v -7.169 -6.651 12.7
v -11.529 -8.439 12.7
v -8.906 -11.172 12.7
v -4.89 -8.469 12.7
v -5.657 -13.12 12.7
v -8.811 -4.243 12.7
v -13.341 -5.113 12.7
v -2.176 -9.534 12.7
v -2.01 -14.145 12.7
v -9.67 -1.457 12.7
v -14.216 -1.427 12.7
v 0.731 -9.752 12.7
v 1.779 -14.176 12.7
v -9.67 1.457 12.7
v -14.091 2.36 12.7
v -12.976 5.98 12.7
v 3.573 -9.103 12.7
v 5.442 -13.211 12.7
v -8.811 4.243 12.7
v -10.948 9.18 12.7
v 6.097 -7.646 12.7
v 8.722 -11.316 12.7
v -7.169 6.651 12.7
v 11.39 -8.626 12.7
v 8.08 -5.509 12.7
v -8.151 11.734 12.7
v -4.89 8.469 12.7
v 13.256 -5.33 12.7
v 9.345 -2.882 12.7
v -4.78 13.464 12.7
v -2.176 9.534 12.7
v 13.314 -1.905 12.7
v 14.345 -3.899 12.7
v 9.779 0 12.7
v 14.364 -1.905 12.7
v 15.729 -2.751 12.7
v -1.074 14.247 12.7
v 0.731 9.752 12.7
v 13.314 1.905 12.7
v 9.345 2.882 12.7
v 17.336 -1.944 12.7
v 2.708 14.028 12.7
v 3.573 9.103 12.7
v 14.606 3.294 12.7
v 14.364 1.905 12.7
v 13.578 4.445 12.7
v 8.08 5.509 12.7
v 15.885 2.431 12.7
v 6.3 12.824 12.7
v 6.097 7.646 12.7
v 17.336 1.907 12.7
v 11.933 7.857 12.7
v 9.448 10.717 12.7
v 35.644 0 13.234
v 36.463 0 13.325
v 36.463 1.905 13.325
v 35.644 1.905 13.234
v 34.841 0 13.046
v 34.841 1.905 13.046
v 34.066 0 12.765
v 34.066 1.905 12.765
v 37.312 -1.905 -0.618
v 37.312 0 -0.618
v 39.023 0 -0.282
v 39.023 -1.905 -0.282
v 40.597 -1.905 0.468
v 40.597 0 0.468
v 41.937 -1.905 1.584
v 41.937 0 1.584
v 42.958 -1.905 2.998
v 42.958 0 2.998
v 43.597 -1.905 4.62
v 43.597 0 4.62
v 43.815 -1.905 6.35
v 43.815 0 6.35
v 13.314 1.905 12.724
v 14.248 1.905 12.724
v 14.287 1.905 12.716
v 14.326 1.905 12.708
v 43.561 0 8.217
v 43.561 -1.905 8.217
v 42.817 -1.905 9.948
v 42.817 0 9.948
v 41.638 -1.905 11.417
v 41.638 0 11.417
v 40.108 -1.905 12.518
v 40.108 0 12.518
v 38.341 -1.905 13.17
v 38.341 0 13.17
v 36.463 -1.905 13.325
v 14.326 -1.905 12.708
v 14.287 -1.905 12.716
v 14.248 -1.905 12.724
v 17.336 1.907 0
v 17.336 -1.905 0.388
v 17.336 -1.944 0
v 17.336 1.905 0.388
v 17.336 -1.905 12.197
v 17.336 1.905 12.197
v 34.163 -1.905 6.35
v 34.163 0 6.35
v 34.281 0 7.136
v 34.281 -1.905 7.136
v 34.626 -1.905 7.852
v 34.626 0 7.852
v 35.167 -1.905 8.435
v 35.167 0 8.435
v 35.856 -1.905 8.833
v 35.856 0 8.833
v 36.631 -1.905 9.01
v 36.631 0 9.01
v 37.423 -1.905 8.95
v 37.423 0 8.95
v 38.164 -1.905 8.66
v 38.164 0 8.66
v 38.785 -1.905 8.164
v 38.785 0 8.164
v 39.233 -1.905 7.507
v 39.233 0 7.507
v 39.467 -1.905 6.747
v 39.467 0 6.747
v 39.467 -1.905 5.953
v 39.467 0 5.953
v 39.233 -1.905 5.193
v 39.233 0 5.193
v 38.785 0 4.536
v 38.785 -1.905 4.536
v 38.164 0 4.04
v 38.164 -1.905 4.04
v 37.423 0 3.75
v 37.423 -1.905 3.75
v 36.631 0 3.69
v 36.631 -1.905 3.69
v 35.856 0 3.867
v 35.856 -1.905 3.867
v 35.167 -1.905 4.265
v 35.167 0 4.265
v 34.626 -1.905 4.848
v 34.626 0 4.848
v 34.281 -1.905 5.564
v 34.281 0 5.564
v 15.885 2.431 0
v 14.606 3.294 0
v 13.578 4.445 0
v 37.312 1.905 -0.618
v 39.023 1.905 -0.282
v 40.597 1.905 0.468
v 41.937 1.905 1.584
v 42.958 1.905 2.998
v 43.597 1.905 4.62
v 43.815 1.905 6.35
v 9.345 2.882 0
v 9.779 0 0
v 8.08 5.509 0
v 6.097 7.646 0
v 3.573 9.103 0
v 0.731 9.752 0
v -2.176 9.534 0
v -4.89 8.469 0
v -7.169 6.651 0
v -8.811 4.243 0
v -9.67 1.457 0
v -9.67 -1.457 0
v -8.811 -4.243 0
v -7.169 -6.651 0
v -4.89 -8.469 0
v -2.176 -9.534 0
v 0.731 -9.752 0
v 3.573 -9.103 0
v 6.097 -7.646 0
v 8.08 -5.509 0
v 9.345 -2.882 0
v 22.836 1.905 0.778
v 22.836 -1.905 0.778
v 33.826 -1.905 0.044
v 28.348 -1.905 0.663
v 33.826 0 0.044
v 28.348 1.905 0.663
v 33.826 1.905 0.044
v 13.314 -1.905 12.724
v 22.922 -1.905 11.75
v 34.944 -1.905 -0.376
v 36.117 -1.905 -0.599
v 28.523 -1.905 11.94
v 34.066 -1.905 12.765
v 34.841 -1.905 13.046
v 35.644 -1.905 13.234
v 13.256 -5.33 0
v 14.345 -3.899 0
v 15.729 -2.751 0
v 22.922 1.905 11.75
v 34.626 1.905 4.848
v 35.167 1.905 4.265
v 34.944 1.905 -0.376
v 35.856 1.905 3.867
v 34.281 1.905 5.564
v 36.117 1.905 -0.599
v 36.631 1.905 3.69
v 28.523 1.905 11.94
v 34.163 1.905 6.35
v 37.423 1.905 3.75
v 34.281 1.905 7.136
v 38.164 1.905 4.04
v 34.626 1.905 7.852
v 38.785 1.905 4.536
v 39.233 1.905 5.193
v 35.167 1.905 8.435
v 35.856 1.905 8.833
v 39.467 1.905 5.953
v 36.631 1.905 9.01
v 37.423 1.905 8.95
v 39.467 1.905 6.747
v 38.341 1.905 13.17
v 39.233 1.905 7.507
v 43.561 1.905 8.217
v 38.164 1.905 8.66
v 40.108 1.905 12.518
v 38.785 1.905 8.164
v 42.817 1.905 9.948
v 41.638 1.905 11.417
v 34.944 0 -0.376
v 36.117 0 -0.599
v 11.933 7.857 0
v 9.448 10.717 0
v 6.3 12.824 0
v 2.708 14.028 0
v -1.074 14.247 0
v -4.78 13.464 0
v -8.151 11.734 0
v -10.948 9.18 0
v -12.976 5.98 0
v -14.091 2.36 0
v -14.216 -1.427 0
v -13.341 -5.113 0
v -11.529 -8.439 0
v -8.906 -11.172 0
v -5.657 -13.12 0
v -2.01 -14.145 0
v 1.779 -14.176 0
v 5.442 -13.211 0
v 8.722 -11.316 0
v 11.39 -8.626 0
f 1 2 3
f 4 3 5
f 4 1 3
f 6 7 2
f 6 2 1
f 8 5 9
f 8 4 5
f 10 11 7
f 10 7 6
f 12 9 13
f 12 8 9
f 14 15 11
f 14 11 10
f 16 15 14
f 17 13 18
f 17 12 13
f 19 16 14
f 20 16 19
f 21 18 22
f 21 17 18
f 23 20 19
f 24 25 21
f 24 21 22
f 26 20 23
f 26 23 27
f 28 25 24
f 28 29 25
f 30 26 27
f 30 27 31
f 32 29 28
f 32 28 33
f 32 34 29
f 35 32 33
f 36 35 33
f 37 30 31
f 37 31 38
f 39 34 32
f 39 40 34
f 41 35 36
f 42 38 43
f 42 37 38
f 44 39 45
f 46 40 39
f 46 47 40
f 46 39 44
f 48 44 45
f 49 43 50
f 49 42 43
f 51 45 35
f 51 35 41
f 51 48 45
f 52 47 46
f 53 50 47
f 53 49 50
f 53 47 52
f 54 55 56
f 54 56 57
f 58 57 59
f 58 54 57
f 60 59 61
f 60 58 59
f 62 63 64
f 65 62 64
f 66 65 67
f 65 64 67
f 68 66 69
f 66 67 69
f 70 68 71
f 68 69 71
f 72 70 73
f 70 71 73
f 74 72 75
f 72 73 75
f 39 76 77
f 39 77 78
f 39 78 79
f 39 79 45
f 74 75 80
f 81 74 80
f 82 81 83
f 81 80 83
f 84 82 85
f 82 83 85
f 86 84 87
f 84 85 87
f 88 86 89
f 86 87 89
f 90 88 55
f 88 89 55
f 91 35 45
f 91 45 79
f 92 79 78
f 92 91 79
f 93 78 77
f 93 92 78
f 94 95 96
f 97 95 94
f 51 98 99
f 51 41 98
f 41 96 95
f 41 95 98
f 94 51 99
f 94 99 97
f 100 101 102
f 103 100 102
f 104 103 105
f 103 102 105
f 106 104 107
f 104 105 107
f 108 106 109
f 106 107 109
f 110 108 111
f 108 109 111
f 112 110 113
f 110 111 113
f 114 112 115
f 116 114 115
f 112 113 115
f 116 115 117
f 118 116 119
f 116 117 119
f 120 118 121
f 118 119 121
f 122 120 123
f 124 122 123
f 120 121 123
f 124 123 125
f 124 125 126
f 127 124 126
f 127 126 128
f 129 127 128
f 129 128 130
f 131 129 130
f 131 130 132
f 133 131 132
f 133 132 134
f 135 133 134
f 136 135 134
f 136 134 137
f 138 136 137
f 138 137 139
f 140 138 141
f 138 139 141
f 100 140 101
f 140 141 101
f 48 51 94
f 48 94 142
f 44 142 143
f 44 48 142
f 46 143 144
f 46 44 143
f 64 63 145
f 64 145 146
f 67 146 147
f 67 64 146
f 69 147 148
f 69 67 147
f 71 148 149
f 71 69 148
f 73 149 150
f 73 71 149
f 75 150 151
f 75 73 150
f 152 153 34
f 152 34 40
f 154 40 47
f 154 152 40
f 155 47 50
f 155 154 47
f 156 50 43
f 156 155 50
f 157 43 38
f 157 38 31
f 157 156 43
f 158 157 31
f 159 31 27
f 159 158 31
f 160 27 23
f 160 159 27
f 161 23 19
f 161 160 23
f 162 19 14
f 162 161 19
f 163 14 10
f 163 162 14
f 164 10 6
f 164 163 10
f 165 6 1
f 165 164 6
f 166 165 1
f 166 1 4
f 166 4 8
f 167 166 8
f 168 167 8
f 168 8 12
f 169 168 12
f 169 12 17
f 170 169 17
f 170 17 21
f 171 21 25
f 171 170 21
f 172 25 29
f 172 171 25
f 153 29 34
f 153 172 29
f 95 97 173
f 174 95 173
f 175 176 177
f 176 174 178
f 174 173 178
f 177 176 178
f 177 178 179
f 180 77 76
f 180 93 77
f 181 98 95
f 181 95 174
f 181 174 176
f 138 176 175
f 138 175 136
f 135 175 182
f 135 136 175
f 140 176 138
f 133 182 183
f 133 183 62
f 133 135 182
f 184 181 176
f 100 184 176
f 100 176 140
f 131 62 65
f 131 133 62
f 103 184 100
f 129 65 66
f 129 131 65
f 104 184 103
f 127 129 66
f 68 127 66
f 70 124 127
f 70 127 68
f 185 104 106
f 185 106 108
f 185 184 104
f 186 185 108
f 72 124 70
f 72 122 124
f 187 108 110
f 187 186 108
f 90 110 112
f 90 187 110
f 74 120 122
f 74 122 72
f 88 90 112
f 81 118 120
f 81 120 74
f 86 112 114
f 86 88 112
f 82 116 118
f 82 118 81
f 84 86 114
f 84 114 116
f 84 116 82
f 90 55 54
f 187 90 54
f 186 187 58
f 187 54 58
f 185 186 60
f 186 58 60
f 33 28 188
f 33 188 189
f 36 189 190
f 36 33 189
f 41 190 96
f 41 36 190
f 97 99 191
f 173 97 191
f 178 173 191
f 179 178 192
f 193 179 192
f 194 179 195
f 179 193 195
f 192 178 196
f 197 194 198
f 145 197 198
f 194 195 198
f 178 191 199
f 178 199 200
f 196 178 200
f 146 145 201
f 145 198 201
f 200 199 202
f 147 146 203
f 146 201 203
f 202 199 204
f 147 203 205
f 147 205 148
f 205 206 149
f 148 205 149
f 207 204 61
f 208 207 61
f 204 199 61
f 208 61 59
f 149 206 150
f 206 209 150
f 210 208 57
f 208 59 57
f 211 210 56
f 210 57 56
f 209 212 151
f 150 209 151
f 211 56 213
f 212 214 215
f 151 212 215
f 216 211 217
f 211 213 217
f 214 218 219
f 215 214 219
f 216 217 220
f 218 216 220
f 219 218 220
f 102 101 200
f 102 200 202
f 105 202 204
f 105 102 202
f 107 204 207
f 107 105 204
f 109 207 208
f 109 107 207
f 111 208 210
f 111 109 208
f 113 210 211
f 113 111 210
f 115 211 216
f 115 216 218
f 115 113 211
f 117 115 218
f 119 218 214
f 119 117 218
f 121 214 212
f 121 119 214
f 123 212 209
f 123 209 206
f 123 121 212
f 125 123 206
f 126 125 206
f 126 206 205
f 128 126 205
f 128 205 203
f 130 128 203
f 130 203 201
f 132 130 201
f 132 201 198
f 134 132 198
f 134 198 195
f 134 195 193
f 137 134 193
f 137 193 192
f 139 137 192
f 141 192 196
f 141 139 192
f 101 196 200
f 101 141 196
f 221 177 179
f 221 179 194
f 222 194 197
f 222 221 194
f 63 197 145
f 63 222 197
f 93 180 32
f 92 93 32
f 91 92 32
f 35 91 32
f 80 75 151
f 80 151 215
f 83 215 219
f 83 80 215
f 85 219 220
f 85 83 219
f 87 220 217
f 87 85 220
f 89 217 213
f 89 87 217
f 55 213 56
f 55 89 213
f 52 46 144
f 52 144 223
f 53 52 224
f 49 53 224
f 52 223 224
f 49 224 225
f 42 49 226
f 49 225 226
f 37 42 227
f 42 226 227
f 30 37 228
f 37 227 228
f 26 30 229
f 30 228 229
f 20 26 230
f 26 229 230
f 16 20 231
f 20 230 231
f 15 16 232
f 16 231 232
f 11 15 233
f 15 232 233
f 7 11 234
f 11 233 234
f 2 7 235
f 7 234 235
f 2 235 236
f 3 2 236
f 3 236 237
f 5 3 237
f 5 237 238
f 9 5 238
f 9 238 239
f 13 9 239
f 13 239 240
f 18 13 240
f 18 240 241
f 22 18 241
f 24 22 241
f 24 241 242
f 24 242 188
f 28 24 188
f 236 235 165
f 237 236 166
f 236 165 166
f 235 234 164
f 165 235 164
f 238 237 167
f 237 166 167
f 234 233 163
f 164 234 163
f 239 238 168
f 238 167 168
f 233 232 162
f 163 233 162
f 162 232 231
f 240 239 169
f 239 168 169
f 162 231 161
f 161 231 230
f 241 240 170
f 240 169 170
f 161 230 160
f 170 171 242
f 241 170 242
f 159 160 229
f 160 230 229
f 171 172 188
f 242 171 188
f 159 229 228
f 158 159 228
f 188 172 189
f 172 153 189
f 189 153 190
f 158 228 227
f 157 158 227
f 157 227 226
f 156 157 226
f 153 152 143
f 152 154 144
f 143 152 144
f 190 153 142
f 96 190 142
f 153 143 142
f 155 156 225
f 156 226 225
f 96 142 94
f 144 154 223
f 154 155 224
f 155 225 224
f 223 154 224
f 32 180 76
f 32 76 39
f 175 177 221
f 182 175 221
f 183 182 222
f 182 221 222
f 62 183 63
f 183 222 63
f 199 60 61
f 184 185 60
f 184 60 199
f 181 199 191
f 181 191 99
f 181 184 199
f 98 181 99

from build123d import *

# Parameters (mm, degrees)
F0_R          = 14.2875
F0_R_2        = 9.779
F1_DEPTH      = 12.7
F3_DEPTH      = 1.905
F3_DEPTH_BACK = 1.905
F5_DEPTH      = 12.7


with BuildPart() as f1:
    # F0 (on Top) → F1 (new body)
    with BuildSketch(Plane.XY):
        Circle(F0_R)
        Circle(F0_R_2, mode=Mode.SUBTRACT)
    extrude(amount=F1_DEPTH)

    # F2 (on Front) → F3 (join, two sides)
    with BuildSketch(Plane.XZ) as f3_sk:
        with BuildLine():
            Line((13.3136538789, 12.7235082909), (13.3136538789, 6.35))
            Line((13.3136538789, 6.35), (29.845, 6.35))
            ThreePointArc((29.845, 6.35), (30.994771982, 10.18931491), (34.0655694999, 12.7646823))
            ThreePointArc((34.0655694999, 12.7646823), (24.1589088565, 11.7366418782), (14.2480619252, 12.7235082909))
            Line((14.2480619252, 12.7235082909), (13.3136538789, 12.7235082909))
        make_face()
        with BuildLine():
            Line((29.845, 6.35), (13.3136538789, 6.35))
            Line((13.3136538789, 6.35), (13.3136538789, 0))
            Line((13.3136538789, 0), (14.5748257637, 0))
            ThreePointArc((14.5748257637, 0), (24.1986734185, 0.7965285613), (33.8260559146, 0.0439279316))
            ThreePointArc((33.8260559146, 0.0439279316), (30.9235300544, 2.6212149725), (29.845, 6.35))
        make_face()
        with BuildLine():
            ThreePointArc((34.0655694999, 12.7646823), (30.994771982, 10.18931491), (29.845, 6.35))
            ThreePointArc((29.845, 6.35), (30.9235300544, 2.6212149725), (33.8260559146, 0.0439279316))
            ThreePointArc((33.8260559146, 0.0439279316), (35.5736615146, -0.2615447543), (37.311506327, -0.6183840779))
            ThreePointArc((37.311506327, -0.6183840779), (41.9365422105, 1.5841368407), (43.815, 6.35))
            ThreePointArc((43.815, 6.35), (41.6376310588, 11.4172387552), (36.4629860837, 13.3253513019))
            ThreePointArc((36.4629860837, 13.3253513019), (35.2677832143, 13.0300276397), (34.0655694999, 12.7646823))
        make_face()
        with BuildLine():
            ThreePointArc((39.497, 6.35), (36.83, 3.683), (34.163, 6.35))
            ThreePointArc((34.163, 6.35), (36.83, 9.017), (39.497, 6.35))
        make_face(mode=Mode.SUBTRACT)
        with BuildLine():
            ThreePointArc((36.4629860837, 13.3253513019), (35.2393795344, 13.1514815691), (34.0655694999, 12.7646823))
            ThreePointArc((34.0655694999, 12.7646823), (35.2677832143, 13.0300276397), (36.4629860837, 13.3253513019))
        make_face()
        with BuildLine():
            ThreePointArc((37.311506327, -0.6183840779), (35.5736615146, -0.2615447543), (33.8260559146, 0.0439279316))
            ThreePointArc((33.8260559146, 0.0439279316), (35.5260301534, -0.5122071988), (37.311506327, -0.6183840779))
        make_face()
    extrude(amount=F3_DEPTH)
    extrude(f3_sk.sketch, amount=-F3_DEPTH_BACK)

    # F4 (on face) → F5 (join, through all)
    with BuildSketch(Plane.XY.offset(12.7)):
        with BuildLine():
            ThreePointArc((17.3360537738, 1.9065266242), (15.2188372166, 2.8229826148), (13.5784069673, 4.4451682175))
            ThreePointArc((13.5784069673, 4.4451682175), (13.9272019714, 3.188369724), (14.1599304818, 1.905))
            Line((14.1599304818, 1.905), (13.4946856848, 1.905))
            Line((13.4946856848, 1.905), (13.4318988812, 0))
            Line((13.4318988812, 0), (17.3360537738, 0))
            Line((17.3360537738, 0), (17.3360537738, 1.9065266242))
        make_face()
        with BuildLine():
            ThreePointArc((14.1599304818, -1.905), (13.8146153266, -3.6454162489), (13.2562405183, -5.3296100767))
            ThreePointArc((13.2562405183, -5.3296100767), (15.0043175715, -3.2852044457), (17.3360537738, -1.9441697514))
            Line((17.3360537738, -1.9441697514), (17.3360537738, 0))
            Line((17.3360537738, 0), (13.4318988812, 0))
            Line((13.4318988812, 0), (13.3691120776, -1.905))
            Line((13.3691120776, -1.905), (14.1599304818, -1.905))
        make_face()
    extrude(amount=-F5_DEPTH)


solid = f1.part
